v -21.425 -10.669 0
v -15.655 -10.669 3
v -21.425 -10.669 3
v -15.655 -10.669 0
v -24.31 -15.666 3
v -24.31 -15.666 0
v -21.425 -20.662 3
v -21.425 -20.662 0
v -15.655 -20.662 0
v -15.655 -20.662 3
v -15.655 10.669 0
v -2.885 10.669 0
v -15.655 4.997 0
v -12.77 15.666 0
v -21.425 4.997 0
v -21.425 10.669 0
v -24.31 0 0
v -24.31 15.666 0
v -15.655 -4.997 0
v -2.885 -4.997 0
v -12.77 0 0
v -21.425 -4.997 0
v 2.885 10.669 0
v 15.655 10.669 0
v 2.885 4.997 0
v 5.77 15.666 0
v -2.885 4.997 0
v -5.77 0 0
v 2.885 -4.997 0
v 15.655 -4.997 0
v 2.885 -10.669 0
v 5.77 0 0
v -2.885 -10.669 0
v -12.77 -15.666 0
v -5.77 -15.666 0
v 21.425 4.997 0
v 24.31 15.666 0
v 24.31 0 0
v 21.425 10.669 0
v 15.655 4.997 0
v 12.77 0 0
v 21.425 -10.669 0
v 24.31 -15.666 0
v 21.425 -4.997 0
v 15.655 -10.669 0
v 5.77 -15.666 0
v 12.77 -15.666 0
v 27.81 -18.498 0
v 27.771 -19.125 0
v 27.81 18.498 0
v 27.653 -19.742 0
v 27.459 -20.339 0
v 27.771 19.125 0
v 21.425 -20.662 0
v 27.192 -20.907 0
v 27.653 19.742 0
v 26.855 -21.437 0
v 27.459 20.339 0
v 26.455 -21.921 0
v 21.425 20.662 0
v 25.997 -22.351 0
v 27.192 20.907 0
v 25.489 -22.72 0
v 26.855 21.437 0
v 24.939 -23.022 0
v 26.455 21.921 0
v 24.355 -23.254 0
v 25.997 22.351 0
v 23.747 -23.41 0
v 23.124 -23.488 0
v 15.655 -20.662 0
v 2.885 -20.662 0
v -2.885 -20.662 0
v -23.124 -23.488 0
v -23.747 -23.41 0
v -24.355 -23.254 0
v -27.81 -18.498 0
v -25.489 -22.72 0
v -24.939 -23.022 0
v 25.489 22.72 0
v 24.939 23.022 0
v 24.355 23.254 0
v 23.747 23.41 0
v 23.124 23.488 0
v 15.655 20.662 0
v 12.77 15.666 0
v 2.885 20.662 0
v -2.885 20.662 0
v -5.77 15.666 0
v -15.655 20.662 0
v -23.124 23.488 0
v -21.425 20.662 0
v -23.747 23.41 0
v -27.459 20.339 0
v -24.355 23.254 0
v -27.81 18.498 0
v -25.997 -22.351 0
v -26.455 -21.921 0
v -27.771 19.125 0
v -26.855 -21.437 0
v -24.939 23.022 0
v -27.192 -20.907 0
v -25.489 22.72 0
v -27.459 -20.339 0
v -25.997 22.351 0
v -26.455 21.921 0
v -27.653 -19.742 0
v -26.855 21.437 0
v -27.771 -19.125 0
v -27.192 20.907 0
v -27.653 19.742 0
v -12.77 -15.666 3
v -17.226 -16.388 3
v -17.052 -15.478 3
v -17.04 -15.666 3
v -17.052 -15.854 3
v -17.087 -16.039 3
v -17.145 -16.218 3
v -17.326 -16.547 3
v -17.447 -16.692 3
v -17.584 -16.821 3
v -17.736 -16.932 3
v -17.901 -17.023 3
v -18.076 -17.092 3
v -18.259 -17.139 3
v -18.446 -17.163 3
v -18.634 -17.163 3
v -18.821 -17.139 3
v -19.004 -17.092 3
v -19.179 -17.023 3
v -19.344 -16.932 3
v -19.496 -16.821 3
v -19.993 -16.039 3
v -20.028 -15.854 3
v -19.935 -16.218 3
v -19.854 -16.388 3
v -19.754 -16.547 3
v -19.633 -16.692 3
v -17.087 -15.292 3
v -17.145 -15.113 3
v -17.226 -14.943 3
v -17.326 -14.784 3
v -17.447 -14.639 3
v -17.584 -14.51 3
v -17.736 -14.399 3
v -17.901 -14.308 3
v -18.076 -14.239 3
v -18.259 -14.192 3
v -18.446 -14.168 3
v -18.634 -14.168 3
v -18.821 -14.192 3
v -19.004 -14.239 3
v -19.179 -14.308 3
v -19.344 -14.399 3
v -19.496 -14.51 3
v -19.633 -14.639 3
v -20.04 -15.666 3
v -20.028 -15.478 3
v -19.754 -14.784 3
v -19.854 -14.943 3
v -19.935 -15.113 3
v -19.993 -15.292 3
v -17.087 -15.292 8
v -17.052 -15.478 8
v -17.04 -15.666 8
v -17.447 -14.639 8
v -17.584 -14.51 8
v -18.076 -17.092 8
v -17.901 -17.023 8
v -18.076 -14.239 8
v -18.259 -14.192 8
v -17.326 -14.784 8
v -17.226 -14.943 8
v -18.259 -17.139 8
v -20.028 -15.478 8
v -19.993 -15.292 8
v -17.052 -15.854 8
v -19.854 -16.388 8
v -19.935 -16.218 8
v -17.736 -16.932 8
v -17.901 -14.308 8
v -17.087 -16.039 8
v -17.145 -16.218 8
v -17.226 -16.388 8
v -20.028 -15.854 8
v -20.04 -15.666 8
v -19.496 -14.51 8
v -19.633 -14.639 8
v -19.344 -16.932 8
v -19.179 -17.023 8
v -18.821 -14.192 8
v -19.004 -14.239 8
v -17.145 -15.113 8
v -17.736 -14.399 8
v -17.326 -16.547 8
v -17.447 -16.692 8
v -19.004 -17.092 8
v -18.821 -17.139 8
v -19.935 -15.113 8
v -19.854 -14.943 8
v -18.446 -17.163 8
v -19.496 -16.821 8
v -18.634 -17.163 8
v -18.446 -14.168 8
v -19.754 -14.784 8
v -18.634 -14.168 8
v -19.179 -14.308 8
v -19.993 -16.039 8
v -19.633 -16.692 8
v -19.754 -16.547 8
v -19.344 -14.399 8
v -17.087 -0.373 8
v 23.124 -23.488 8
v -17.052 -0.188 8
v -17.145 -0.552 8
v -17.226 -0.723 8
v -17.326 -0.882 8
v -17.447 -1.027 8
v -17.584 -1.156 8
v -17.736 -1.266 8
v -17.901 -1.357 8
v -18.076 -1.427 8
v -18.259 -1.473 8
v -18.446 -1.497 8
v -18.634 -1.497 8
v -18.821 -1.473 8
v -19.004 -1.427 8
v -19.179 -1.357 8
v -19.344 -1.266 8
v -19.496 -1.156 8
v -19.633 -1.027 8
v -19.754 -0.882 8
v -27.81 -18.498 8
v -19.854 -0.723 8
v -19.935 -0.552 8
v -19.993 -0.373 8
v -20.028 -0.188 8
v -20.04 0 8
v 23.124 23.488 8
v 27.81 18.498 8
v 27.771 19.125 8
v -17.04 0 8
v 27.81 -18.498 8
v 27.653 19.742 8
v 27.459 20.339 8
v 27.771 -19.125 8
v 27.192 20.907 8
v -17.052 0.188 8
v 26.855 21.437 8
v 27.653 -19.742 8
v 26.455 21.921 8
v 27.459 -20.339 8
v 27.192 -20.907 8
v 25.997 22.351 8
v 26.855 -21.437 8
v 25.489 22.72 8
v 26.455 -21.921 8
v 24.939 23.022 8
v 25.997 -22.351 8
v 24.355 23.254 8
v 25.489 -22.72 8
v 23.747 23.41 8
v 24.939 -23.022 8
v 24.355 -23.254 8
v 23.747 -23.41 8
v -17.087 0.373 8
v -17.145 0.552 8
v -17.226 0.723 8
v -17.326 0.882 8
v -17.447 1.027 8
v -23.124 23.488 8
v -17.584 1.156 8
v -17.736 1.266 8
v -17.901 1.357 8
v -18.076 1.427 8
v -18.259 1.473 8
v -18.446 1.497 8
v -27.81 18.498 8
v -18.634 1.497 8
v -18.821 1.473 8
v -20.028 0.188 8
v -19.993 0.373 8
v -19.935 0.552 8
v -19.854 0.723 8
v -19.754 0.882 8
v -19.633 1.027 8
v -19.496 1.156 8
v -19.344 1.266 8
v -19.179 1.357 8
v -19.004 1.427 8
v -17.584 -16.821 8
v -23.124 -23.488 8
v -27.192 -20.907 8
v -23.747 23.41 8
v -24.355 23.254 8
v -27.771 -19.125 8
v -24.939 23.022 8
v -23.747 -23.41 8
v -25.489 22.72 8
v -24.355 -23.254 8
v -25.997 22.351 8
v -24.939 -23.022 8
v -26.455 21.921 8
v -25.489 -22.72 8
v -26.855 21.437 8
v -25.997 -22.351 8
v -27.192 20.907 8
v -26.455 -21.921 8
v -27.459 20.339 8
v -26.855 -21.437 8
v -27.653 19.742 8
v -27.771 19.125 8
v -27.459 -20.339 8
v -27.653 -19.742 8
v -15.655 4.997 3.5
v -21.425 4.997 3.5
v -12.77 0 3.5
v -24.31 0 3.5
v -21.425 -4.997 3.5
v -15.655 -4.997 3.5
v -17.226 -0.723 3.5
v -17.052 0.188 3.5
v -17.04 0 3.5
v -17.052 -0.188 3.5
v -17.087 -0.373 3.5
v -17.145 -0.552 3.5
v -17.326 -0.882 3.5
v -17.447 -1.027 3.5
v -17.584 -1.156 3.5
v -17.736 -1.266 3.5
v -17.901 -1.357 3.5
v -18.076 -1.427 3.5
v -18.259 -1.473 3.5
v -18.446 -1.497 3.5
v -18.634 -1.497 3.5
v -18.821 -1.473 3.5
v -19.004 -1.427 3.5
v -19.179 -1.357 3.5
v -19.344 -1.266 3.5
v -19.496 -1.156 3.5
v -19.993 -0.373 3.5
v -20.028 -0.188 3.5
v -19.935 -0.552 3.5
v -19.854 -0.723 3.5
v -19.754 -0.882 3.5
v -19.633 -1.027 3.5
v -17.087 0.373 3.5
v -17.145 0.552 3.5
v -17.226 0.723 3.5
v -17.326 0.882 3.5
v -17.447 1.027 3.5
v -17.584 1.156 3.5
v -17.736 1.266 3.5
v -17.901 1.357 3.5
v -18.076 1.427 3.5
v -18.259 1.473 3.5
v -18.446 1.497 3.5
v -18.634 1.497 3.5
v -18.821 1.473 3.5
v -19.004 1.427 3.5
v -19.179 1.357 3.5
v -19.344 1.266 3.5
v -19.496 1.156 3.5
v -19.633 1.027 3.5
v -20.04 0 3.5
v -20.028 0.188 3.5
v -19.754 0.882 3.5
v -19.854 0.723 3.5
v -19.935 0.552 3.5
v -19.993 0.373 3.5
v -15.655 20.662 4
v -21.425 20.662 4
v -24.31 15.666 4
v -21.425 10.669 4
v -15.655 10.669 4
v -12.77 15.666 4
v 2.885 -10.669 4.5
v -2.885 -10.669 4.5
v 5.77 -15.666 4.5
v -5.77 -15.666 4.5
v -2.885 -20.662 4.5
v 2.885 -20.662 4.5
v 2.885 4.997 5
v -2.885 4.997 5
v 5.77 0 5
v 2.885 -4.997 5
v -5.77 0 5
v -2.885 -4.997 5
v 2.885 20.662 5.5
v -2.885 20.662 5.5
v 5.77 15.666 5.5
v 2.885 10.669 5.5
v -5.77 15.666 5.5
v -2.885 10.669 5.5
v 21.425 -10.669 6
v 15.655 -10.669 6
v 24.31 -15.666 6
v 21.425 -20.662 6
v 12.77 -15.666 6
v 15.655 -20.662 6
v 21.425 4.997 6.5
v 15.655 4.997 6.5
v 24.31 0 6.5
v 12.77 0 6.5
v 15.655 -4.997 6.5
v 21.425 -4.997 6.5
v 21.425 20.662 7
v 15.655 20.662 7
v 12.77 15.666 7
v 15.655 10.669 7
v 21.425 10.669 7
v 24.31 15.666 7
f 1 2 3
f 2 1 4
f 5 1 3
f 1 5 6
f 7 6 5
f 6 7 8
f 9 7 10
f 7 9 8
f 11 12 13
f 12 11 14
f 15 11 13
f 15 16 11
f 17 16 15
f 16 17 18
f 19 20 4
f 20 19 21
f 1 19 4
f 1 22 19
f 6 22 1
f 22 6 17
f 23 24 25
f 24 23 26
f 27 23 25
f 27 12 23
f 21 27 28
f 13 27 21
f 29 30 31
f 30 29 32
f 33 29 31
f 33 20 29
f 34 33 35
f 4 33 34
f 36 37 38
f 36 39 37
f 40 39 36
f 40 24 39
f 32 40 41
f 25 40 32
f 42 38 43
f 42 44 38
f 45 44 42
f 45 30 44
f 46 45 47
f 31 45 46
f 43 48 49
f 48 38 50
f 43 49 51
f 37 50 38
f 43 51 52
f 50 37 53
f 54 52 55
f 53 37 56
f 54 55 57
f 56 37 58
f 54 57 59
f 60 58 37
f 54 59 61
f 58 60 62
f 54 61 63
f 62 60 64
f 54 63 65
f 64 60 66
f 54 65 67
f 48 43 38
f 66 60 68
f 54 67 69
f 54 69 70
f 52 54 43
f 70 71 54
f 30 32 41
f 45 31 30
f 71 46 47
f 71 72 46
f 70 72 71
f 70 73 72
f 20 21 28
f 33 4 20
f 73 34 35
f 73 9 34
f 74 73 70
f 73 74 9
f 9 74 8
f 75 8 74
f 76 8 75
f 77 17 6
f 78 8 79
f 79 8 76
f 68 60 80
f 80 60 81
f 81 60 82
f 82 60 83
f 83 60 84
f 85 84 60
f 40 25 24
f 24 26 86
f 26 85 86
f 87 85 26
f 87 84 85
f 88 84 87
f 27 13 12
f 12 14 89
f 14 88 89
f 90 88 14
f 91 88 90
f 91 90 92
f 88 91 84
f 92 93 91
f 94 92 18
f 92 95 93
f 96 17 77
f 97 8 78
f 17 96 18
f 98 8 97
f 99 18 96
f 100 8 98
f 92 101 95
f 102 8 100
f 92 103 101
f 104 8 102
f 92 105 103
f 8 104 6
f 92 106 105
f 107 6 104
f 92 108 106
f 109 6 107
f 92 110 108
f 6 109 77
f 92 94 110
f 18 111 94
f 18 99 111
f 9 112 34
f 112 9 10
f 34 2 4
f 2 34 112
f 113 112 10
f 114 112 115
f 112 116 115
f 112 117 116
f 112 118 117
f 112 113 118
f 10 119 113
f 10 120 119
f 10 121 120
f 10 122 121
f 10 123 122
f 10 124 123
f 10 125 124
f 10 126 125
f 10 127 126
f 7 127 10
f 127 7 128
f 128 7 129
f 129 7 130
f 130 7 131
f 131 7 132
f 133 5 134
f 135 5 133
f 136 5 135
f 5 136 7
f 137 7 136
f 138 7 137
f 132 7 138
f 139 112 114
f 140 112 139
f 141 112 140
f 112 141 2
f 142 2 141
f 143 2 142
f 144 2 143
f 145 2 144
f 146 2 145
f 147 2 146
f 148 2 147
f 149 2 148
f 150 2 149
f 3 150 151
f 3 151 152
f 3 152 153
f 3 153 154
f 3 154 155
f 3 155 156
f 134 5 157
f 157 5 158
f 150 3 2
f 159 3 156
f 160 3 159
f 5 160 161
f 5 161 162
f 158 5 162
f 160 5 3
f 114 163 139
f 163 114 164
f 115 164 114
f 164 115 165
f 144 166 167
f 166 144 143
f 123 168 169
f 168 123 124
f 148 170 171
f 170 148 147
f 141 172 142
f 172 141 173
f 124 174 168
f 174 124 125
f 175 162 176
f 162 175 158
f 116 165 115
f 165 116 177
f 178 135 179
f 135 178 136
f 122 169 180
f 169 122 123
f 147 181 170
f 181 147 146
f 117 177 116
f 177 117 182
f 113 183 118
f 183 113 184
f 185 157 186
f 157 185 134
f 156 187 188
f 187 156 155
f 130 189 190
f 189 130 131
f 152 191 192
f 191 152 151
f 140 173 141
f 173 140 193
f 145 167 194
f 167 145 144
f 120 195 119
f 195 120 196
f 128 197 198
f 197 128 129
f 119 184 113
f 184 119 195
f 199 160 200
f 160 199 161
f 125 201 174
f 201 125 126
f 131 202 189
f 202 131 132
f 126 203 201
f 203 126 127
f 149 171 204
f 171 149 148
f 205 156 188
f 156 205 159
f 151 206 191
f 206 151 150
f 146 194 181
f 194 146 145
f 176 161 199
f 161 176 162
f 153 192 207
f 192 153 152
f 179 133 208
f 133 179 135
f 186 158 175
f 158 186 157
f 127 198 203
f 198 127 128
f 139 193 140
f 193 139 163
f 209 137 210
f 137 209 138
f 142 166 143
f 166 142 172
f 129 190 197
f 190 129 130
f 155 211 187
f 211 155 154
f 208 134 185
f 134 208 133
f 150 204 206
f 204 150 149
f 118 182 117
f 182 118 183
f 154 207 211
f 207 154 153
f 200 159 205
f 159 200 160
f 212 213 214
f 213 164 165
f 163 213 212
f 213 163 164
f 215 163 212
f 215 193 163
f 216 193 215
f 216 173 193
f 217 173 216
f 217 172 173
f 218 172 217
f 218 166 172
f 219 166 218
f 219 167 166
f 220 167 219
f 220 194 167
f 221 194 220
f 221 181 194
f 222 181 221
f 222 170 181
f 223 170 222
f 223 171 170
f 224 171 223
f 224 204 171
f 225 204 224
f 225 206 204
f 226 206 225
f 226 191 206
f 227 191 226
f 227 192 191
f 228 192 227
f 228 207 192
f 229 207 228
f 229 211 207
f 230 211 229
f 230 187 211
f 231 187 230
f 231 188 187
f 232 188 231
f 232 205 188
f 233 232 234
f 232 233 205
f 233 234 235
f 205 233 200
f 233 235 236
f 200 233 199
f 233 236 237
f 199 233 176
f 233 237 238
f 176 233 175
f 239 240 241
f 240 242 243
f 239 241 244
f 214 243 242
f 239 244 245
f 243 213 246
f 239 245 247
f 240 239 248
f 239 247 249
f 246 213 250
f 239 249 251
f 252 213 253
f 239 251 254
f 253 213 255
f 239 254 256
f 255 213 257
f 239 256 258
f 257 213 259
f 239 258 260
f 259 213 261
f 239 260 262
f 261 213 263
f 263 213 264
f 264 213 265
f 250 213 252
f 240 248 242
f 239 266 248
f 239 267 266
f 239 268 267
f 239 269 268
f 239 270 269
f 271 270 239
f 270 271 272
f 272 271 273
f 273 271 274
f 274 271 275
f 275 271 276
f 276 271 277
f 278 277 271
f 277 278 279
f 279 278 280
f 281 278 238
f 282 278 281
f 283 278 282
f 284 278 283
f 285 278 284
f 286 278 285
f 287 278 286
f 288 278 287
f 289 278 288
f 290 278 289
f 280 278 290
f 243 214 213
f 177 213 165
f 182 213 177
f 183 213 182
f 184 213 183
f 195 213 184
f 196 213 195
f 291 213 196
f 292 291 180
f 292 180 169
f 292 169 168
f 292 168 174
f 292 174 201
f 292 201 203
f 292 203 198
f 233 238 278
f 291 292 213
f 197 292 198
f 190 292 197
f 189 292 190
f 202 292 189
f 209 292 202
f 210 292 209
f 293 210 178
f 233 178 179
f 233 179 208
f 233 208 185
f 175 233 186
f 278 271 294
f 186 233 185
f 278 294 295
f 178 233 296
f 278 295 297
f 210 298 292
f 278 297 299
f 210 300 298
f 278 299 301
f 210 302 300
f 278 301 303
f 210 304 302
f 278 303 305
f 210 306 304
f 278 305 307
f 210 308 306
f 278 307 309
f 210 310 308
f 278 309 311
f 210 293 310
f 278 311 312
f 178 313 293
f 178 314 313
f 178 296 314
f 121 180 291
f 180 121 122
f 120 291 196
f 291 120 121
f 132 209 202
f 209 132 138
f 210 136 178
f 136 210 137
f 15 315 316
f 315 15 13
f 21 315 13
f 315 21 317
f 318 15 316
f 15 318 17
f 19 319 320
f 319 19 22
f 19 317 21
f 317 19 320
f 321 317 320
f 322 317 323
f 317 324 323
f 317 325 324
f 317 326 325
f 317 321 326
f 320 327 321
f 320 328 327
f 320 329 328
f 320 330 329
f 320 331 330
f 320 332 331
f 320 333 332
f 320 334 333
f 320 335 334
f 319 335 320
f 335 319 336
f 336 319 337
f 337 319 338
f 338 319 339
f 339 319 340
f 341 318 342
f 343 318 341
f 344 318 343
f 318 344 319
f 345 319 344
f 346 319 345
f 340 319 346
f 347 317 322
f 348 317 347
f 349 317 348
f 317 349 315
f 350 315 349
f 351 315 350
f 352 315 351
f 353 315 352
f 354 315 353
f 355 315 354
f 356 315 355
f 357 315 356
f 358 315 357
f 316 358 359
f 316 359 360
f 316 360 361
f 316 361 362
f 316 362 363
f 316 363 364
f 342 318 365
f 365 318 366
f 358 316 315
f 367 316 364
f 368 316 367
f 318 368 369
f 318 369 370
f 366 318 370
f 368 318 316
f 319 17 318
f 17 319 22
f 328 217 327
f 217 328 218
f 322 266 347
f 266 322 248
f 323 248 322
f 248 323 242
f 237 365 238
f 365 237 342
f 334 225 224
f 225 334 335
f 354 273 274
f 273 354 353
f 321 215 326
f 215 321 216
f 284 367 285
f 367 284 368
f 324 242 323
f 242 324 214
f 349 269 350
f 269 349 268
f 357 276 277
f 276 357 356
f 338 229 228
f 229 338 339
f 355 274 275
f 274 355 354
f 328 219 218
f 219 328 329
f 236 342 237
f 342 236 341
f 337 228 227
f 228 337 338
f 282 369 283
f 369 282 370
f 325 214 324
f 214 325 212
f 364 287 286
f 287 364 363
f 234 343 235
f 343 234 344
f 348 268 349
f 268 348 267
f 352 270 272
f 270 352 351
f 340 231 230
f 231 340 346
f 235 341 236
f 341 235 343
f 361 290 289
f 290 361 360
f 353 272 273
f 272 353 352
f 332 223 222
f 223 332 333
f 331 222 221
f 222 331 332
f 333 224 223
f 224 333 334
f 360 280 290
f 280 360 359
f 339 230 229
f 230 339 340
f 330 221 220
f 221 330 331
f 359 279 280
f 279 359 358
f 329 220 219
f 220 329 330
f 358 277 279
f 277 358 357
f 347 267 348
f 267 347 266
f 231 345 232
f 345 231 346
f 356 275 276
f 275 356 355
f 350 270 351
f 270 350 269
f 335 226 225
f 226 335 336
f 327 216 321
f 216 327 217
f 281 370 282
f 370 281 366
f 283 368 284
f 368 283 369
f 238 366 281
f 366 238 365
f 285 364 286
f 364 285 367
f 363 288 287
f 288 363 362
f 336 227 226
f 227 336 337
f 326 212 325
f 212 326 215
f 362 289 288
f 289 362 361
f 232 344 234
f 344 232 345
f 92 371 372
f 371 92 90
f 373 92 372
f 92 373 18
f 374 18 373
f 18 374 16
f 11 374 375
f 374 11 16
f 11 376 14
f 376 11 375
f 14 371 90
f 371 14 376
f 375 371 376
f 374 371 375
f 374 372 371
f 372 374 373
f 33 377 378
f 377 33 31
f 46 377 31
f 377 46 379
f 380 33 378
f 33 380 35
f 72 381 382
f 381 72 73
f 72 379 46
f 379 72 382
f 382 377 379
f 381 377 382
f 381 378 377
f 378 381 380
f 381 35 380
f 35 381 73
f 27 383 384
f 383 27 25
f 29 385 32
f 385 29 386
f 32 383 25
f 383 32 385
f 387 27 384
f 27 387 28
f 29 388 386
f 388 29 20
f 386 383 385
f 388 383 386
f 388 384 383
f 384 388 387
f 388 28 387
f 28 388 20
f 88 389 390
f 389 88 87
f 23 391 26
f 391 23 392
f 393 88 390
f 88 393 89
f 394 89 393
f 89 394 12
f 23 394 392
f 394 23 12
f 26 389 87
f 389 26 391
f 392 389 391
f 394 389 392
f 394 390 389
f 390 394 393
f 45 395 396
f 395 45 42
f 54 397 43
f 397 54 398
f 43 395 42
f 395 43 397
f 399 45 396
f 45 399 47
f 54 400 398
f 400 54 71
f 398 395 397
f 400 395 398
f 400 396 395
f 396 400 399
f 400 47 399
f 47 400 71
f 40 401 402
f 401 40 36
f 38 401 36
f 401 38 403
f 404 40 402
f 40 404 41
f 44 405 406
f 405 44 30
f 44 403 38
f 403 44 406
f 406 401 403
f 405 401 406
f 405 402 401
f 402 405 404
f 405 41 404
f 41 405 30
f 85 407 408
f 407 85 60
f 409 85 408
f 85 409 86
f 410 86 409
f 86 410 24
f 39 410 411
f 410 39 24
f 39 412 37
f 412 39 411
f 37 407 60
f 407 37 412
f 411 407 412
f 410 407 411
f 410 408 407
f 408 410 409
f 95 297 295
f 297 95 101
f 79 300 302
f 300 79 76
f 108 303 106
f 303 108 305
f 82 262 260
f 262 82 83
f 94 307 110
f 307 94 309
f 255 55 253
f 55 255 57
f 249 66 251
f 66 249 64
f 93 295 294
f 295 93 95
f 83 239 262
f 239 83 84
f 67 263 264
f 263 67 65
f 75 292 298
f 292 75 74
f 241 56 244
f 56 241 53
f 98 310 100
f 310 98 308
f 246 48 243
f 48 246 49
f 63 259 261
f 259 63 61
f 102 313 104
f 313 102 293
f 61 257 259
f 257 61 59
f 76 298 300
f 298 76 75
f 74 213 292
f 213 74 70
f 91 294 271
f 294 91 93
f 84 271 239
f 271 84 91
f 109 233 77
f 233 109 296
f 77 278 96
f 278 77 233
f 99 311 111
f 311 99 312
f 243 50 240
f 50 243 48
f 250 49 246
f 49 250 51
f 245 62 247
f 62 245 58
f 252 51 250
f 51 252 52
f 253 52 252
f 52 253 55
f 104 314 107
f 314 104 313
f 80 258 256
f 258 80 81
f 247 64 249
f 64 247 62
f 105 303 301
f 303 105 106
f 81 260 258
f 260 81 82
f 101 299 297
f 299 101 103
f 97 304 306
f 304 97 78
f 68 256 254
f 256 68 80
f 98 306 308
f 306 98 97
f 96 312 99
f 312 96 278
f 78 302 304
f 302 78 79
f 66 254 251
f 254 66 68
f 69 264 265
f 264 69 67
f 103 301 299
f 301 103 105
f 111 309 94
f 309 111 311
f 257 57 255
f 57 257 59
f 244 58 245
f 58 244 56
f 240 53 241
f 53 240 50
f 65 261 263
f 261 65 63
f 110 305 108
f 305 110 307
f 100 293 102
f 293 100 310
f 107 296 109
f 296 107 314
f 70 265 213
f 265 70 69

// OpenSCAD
$fn = 50;


difference() {
	union() {
		translate(v = [0, 0, 0]) {
			rotate(a = [0, 0, 0]) {
				hull() {
					translate(v = [-22.8100000000, 18.4982668977, 0]) {
						rotate(a = [0, 0, 0]) {
							translate(v = [0, 0, 0]) {
								rotate(a = [0, 0, 0]) {
									cylinder(h = 8, r = 5);
								}
							}
						}
					}
					translate(v = [22.8100000000, 18.4982668977, 0]) {
						rotate(a = [0, 0, 0]) {
							translate(v = [0, 0, 0]) {
								rotate(a = [0, 0, 0]) {
									cylinder(h = 8, r = 5);
								}
							}
						}
					}
					translate(v = [-22.8100000000, -18.4982668977, 0]) {
						rotate(a = [0, 0, 0]) {
							translate(v = [0, 0, 0]) {
								rotate(a = [0, 0, 0]) {
									cylinder(h = 8, r = 5);
								}
							}
						}
					}
					translate(v = [22.8100000000, -18.4982668977, 0]) {
						rotate(a = [0, 0, 0]) {
							translate(v = [0, 0, 0]) {
								rotate(a = [0, 0, 0]) {
									cylinder(h = 8, r = 5);
								}
							}
						}
					}
				}
			}
		}
	}
	union() {
		translate(v = [-18.5400000000, -15.6655112652, 0]) {
			rotate(a = [0, 0, 0]) {
				#translate(v = [0, 0, 0]) {
					rotate(a = [0, 0, 0]) {
						linear_extrude(height = 3.0000000000) {
							polygon(points = [[5.7700000000, 0.0000000000], [2.8850000000, 4.9969665798], [-2.8850000000, 4.9969665798], [-5.7700000000, 0.0000000000], [-2.8850000000, -4.9969665798], [2.8850000000, -4.9969665798]]);
						}
					}
				}
			}
		}
		translate(v = [-18.5400000000, -15.6655112652, 0]) {
			rotate(a = [0, 0, 0]) {
				cylinder(h = 8, r = 1.5000000000);
			}
		}
		translate(v = [-18.5400000000, 0.0000000000, 0]) {
			rotate(a = [0, 0, 0]) {
				#translate(v = [0, 0, 0]) {
					rotate(a = [0, 0, 0]) {
						linear_extrude(height = 3.5000000000) {
							polygon(points = [[5.7700000000, 0.0000000000], [2.8850000000, 4.9969665798], [-2.8850000000, 4.9969665798], [-5.7700000000, 0.0000000000], [-2.8850000000, -4.9969665798], [2.8850000000, -4.9969665798]]);
						}
					}
				}
			}
		}
		translate(v = [-18.5400000000, 0.0000000000, 0]) {
			rotate(a = [0, 0, 0]) {
				cylinder(h = 8, r = 1.5000000000);
			}
		}
		translate(v = [-18.5400000000, 15.6655112652, 0]) {
			rotate(a = [0, 0, 0]) {
				#translate(v = [0, 0, 0]) {
					rotate(a = [0, 0, 0]) {
						linear_extrude(height = 4.0000000000) {
							polygon(points = [[5.7700000000, 0.0000000000], [2.8850000000, 4.9969665798], [-2.8850000000, 4.9969665798], [-5.7700000000, 0.0000000000], [-2.8850000000, -4.9969665798], [2.8850000000, -4.9969665798]]);
						}
					}
				}
			}
		}
		translate(v = [0.0000000000, -15.6655112652, 0]) {
			rotate(a = [0, 0, 0]) {
				#translate(v = [0, 0, 0]) {
					rotate(a = [0, 0, 0]) {
						linear_extrude(height = 4.5000000000) {
							polygon(points = [[5.7700000000, 0.0000000000], [2.8850000000, 4.9969665798], [-2.8850000000, 4.9969665798], [-5.7700000000, 0.0000000000], [-2.8850000000, -4.9969665798], [2.8850000000, -4.9969665798]]);
						}
					}
				}
			}
		}
		translate(v = [0.0000000000, 0.0000000000, 0]) {
			rotate(a = [0, 0, 0]) {
				#translate(v = [0, 0, 0]) {
					rotate(a = [0, 0, 0]) {
						linear_extrude(height = 5.0000000000) {
							polygon(points = [[5.7700000000, 0.0000000000], [2.8850000000, 4.9969665798], [-2.8850000000, 4.9969665798], [-5.7700000000, 0.0000000000], [-2.8850000000, -4.9969665798], [2.8850000000, -4.9969665798]]);
						}
					}
				}
			}
		}
		translate(v = [0.0000000000, 15.6655112652, 0]) {
			rotate(a = [0, 0, 0]) {
				#translate(v = [0, 0, 0]) {
					rotate(a = [0, 0, 0]) {
						linear_extrude(height = 5.5000000000) {
							polygon(points = [[5.7700000000, 0.0000000000], [2.8850000000, 4.9969665798], [-2.8850000000, 4.9969665798], [-5.7700000000, 0.0000000000], [-2.8850000000, -4.9969665798], [2.8850000000, -4.9969665798]]);
						}
					}
				}
			}
		}
		translate(v = [18.5400000000, -15.6655112652, 0]) {
			rotate(a = [0, 0, 0]) {
				#translate(v = [0, 0, 0]) {
					rotate(a = [0, 0, 0]) {
						linear_extrude(height = 6.0000000000) {
							polygon(points = [[5.7700000000, 0.0000000000], [2.8850000000, 4.9969665798], [-2.8850000000, 4.9969665798], [-5.7700000000, 0.0000000000], [-2.8850000000, -4.9969665798], [2.8850000000, -4.9969665798]]);
						}
					}
				}
			}
		}
		translate(v = [18.5400000000, 0.0000000000, 0]) {
			rotate(a = [0, 0, 0]) {
				#translate(v = [0, 0, 0]) {
					rotate(a = [0, 0, 0]) {
						linear_extrude(height = 6.5000000000) {
							polygon(points = [[5.7700000000, 0.0000000000], [2.8850000000, 4.9969665798], [-2.8850000000, 4.9969665798], [-5.7700000000, 0.0000000000], [-2.8850000000, -4.9969665798], [2.8850000000, -4.9969665798]]);
						}
					}
				}
			}
		}
		translate(v = [18.5400000000, 15.6655112652, 0]) {
			rotate(a = [0, 0, 0]) {
				#translate(v = [0, 0, 0]) {
					rotate(a = [0, 0, 0]) {
						linear_extrude(height = 7.0000000000) {
							polygon(points = [[5.7700000000, 0.0000000000], [2.8850000000, 4.9969665798], [-2.8850000000, 4.9969665798], [-5.7700000000, 0.0000000000], [-2.8850000000, -4.9969665798], [2.8850000000, -4.9969665798]]);
						}
					}
				}
			}
		}
	}
}
